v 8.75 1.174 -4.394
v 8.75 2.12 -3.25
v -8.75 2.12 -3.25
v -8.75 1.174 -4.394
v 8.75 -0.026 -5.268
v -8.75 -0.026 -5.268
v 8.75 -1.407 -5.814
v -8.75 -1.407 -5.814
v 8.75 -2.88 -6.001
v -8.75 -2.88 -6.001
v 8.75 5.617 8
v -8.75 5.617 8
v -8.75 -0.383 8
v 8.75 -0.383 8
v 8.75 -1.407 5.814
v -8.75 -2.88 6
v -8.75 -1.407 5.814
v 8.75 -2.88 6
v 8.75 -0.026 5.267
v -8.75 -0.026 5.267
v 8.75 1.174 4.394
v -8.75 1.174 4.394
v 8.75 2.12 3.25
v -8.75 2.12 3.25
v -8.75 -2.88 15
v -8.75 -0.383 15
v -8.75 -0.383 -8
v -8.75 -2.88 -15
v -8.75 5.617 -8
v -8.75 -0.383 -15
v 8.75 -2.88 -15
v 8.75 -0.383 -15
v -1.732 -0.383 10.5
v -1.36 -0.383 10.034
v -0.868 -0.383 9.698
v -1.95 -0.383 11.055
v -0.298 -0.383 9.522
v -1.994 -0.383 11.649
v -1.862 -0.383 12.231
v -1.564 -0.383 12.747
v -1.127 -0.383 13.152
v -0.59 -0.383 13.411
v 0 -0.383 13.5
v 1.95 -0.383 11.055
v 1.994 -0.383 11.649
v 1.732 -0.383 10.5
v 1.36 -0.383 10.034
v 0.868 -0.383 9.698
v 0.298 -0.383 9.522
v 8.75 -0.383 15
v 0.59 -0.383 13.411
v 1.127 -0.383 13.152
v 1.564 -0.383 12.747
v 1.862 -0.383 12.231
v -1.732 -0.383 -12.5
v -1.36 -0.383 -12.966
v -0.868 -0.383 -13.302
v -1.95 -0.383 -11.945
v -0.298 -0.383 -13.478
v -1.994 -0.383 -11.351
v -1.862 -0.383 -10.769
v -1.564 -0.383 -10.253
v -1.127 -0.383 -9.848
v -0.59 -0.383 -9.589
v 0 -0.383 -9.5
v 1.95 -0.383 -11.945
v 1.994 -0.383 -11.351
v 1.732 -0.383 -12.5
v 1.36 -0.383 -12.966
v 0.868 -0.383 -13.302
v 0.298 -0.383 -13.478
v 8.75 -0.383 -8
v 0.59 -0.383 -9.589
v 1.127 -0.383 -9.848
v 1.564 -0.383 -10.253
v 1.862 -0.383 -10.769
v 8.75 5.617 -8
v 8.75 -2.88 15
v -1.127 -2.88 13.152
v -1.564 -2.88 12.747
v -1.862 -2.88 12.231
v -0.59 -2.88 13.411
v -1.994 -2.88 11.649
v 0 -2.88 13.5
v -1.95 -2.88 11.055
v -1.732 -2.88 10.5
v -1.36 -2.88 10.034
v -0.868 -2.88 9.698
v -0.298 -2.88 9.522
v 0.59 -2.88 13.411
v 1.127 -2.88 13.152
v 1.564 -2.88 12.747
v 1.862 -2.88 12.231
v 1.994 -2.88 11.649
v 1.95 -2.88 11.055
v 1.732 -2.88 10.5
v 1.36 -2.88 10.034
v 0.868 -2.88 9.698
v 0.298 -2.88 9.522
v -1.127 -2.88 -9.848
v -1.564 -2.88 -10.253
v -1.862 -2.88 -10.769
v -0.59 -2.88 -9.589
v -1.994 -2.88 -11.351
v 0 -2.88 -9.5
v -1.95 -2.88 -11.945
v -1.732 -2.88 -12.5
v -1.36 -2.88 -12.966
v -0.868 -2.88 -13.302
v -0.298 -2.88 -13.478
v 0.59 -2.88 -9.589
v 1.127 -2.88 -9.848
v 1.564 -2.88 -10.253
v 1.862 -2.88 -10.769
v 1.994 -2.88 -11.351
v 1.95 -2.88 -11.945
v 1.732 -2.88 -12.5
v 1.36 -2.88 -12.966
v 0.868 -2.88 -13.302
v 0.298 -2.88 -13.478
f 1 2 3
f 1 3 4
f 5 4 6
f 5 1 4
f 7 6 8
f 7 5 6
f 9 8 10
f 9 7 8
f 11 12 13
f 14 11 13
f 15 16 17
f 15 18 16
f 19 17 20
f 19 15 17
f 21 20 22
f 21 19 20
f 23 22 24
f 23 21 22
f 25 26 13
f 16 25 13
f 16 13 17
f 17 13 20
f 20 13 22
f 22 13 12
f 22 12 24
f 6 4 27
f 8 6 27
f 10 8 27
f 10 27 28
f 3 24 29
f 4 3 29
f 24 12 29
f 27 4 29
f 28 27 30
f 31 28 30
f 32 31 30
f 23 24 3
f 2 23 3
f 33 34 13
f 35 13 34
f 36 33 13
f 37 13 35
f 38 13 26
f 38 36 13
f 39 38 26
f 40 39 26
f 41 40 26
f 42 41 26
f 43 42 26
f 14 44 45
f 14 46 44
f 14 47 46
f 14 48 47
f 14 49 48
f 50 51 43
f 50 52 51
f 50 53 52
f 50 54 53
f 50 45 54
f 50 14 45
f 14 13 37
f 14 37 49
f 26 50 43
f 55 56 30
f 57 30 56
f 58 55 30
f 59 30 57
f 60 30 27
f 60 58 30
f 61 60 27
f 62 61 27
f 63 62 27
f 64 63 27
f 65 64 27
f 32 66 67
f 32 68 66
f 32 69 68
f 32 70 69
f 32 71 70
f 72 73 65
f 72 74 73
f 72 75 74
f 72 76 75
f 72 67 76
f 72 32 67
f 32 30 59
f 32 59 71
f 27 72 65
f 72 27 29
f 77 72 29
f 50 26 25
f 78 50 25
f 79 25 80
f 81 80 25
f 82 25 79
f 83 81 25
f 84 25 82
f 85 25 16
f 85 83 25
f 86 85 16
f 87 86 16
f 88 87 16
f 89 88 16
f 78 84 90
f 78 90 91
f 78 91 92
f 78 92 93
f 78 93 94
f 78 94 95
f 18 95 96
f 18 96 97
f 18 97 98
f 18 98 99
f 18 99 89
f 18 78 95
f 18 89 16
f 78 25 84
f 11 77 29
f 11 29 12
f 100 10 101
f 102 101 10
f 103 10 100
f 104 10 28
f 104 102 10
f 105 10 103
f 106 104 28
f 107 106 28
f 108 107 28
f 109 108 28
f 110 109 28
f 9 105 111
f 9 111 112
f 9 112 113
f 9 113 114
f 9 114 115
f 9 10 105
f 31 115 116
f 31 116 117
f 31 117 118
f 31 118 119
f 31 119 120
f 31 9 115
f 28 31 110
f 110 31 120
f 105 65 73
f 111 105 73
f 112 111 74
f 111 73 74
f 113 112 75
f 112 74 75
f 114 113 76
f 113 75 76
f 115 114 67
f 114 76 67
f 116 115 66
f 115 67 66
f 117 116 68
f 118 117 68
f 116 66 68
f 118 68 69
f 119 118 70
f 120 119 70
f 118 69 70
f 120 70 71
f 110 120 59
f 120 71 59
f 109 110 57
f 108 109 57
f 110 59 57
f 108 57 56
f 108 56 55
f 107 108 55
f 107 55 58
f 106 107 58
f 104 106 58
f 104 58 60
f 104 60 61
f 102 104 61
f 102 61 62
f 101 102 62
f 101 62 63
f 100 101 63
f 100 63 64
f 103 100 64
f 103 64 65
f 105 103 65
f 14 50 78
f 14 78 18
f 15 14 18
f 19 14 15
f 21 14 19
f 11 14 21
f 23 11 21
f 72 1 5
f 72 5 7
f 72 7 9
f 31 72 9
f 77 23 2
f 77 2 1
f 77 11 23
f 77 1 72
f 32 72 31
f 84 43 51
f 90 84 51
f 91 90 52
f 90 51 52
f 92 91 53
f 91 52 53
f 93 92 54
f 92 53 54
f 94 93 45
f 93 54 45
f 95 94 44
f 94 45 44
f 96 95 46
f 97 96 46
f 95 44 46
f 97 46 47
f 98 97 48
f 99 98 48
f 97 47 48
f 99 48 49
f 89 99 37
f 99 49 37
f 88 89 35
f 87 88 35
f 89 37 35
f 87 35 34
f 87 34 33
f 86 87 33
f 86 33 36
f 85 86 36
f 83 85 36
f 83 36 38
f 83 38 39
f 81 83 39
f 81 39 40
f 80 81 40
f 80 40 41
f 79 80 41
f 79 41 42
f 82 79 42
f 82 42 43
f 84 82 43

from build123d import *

# Parameters (mm, degrees)
EXTRUDE_1_DEPTH     = 8.75
CUT_EXTRUDE_1_REACH = 20.251
SKETCH_3_R          = 2


with BuildPart() as part:
    # 草圖1 → 填料-伸長1 (new, symmetric)
    with BuildSketch(Plane(origin=(0, 0, 0), x_dir=(0, 0, -1), z_dir=(1, 0, 0))):
        with BuildLine():
            Line((-3.250001327, 2.120345625), (3.250001327, 2.120345625))
            ThreePointArc((3.250001327, 2.120345625), (5.267515394, -0.02636871), (6.00066364, -2.879654375))
            Line((6.00066364, -2.879654375), (15, -2.879654375))
            Line((15, -2.879654375), (15, -0.382935225))
            Line((15, -0.382935225), (8, -0.382935225))
            Line((8, -0.382935225), (8, 5.617064775))
            Line((8, 5.617064775), (-8, 5.617064775))
            Line((-8, 5.617064775), (-8, -0.382935225))
            Line((-8, -0.382935225), (-15, -0.382935225))
            Line((-15, -0.382935225), (-15, -2.879654375))
            Line((-15, -2.879654375), (-5.999788855, -2.879654375))
            ThreePointArc((-5.999788855, -2.879654375), (-5.267080125, -0.026479896), (-3.250001327, 2.120345625))
        make_face()
    extrude(amount=EXTRUDE_1_DEPTH, both=True)

    # 草圖3 → 除料-伸長1 (cut, up to next)
    with BuildSketch(Plane(origin=(0, 0, 0), x_dir=(1, 0, 0), z_dir=(0, 1, 0)), mode=Mode.PRIVATE) as cut_extrude_1_sk1:
        with Locations(Location((0, 11.5, 0), (0, 0, 270))):
            Circle(SKETCH_3_R)
    cut_extrude_1_tool1 = extrude(cut_extrude_1_sk1.sketch, amount=-CUT_EXTRUDE_1_REACH, mode=Mode.PRIVATE) & part.part
    # 草圖3 → 除料-伸長1 (cut, up to next)
    with BuildSketch(Plane(origin=(0, 0, 0), x_dir=(1, 0, 0), z_dir=(0, 1, 0)), mode=Mode.PRIVATE) as cut_extrude_1_sk2:
        with Locations(Location((0, -11.5, 0), (0, 0, 270))):
            Circle(SKETCH_3_R)
    cut_extrude_1_tool2 = extrude(cut_extrude_1_sk2.sketch, amount=-CUT_EXTRUDE_1_REACH, mode=Mode.PRIVATE) & part.part
    add(cut_extrude_1_tool1.solids().sort_by_distance((0, 0, -11.5))[0], mode=Mode.SUBTRACT)
    add(cut_extrude_1_tool2.solids().sort_by_distance((0, 0, 11.5))[0], mode=Mode.SUBTRACT)


solid = part.part
